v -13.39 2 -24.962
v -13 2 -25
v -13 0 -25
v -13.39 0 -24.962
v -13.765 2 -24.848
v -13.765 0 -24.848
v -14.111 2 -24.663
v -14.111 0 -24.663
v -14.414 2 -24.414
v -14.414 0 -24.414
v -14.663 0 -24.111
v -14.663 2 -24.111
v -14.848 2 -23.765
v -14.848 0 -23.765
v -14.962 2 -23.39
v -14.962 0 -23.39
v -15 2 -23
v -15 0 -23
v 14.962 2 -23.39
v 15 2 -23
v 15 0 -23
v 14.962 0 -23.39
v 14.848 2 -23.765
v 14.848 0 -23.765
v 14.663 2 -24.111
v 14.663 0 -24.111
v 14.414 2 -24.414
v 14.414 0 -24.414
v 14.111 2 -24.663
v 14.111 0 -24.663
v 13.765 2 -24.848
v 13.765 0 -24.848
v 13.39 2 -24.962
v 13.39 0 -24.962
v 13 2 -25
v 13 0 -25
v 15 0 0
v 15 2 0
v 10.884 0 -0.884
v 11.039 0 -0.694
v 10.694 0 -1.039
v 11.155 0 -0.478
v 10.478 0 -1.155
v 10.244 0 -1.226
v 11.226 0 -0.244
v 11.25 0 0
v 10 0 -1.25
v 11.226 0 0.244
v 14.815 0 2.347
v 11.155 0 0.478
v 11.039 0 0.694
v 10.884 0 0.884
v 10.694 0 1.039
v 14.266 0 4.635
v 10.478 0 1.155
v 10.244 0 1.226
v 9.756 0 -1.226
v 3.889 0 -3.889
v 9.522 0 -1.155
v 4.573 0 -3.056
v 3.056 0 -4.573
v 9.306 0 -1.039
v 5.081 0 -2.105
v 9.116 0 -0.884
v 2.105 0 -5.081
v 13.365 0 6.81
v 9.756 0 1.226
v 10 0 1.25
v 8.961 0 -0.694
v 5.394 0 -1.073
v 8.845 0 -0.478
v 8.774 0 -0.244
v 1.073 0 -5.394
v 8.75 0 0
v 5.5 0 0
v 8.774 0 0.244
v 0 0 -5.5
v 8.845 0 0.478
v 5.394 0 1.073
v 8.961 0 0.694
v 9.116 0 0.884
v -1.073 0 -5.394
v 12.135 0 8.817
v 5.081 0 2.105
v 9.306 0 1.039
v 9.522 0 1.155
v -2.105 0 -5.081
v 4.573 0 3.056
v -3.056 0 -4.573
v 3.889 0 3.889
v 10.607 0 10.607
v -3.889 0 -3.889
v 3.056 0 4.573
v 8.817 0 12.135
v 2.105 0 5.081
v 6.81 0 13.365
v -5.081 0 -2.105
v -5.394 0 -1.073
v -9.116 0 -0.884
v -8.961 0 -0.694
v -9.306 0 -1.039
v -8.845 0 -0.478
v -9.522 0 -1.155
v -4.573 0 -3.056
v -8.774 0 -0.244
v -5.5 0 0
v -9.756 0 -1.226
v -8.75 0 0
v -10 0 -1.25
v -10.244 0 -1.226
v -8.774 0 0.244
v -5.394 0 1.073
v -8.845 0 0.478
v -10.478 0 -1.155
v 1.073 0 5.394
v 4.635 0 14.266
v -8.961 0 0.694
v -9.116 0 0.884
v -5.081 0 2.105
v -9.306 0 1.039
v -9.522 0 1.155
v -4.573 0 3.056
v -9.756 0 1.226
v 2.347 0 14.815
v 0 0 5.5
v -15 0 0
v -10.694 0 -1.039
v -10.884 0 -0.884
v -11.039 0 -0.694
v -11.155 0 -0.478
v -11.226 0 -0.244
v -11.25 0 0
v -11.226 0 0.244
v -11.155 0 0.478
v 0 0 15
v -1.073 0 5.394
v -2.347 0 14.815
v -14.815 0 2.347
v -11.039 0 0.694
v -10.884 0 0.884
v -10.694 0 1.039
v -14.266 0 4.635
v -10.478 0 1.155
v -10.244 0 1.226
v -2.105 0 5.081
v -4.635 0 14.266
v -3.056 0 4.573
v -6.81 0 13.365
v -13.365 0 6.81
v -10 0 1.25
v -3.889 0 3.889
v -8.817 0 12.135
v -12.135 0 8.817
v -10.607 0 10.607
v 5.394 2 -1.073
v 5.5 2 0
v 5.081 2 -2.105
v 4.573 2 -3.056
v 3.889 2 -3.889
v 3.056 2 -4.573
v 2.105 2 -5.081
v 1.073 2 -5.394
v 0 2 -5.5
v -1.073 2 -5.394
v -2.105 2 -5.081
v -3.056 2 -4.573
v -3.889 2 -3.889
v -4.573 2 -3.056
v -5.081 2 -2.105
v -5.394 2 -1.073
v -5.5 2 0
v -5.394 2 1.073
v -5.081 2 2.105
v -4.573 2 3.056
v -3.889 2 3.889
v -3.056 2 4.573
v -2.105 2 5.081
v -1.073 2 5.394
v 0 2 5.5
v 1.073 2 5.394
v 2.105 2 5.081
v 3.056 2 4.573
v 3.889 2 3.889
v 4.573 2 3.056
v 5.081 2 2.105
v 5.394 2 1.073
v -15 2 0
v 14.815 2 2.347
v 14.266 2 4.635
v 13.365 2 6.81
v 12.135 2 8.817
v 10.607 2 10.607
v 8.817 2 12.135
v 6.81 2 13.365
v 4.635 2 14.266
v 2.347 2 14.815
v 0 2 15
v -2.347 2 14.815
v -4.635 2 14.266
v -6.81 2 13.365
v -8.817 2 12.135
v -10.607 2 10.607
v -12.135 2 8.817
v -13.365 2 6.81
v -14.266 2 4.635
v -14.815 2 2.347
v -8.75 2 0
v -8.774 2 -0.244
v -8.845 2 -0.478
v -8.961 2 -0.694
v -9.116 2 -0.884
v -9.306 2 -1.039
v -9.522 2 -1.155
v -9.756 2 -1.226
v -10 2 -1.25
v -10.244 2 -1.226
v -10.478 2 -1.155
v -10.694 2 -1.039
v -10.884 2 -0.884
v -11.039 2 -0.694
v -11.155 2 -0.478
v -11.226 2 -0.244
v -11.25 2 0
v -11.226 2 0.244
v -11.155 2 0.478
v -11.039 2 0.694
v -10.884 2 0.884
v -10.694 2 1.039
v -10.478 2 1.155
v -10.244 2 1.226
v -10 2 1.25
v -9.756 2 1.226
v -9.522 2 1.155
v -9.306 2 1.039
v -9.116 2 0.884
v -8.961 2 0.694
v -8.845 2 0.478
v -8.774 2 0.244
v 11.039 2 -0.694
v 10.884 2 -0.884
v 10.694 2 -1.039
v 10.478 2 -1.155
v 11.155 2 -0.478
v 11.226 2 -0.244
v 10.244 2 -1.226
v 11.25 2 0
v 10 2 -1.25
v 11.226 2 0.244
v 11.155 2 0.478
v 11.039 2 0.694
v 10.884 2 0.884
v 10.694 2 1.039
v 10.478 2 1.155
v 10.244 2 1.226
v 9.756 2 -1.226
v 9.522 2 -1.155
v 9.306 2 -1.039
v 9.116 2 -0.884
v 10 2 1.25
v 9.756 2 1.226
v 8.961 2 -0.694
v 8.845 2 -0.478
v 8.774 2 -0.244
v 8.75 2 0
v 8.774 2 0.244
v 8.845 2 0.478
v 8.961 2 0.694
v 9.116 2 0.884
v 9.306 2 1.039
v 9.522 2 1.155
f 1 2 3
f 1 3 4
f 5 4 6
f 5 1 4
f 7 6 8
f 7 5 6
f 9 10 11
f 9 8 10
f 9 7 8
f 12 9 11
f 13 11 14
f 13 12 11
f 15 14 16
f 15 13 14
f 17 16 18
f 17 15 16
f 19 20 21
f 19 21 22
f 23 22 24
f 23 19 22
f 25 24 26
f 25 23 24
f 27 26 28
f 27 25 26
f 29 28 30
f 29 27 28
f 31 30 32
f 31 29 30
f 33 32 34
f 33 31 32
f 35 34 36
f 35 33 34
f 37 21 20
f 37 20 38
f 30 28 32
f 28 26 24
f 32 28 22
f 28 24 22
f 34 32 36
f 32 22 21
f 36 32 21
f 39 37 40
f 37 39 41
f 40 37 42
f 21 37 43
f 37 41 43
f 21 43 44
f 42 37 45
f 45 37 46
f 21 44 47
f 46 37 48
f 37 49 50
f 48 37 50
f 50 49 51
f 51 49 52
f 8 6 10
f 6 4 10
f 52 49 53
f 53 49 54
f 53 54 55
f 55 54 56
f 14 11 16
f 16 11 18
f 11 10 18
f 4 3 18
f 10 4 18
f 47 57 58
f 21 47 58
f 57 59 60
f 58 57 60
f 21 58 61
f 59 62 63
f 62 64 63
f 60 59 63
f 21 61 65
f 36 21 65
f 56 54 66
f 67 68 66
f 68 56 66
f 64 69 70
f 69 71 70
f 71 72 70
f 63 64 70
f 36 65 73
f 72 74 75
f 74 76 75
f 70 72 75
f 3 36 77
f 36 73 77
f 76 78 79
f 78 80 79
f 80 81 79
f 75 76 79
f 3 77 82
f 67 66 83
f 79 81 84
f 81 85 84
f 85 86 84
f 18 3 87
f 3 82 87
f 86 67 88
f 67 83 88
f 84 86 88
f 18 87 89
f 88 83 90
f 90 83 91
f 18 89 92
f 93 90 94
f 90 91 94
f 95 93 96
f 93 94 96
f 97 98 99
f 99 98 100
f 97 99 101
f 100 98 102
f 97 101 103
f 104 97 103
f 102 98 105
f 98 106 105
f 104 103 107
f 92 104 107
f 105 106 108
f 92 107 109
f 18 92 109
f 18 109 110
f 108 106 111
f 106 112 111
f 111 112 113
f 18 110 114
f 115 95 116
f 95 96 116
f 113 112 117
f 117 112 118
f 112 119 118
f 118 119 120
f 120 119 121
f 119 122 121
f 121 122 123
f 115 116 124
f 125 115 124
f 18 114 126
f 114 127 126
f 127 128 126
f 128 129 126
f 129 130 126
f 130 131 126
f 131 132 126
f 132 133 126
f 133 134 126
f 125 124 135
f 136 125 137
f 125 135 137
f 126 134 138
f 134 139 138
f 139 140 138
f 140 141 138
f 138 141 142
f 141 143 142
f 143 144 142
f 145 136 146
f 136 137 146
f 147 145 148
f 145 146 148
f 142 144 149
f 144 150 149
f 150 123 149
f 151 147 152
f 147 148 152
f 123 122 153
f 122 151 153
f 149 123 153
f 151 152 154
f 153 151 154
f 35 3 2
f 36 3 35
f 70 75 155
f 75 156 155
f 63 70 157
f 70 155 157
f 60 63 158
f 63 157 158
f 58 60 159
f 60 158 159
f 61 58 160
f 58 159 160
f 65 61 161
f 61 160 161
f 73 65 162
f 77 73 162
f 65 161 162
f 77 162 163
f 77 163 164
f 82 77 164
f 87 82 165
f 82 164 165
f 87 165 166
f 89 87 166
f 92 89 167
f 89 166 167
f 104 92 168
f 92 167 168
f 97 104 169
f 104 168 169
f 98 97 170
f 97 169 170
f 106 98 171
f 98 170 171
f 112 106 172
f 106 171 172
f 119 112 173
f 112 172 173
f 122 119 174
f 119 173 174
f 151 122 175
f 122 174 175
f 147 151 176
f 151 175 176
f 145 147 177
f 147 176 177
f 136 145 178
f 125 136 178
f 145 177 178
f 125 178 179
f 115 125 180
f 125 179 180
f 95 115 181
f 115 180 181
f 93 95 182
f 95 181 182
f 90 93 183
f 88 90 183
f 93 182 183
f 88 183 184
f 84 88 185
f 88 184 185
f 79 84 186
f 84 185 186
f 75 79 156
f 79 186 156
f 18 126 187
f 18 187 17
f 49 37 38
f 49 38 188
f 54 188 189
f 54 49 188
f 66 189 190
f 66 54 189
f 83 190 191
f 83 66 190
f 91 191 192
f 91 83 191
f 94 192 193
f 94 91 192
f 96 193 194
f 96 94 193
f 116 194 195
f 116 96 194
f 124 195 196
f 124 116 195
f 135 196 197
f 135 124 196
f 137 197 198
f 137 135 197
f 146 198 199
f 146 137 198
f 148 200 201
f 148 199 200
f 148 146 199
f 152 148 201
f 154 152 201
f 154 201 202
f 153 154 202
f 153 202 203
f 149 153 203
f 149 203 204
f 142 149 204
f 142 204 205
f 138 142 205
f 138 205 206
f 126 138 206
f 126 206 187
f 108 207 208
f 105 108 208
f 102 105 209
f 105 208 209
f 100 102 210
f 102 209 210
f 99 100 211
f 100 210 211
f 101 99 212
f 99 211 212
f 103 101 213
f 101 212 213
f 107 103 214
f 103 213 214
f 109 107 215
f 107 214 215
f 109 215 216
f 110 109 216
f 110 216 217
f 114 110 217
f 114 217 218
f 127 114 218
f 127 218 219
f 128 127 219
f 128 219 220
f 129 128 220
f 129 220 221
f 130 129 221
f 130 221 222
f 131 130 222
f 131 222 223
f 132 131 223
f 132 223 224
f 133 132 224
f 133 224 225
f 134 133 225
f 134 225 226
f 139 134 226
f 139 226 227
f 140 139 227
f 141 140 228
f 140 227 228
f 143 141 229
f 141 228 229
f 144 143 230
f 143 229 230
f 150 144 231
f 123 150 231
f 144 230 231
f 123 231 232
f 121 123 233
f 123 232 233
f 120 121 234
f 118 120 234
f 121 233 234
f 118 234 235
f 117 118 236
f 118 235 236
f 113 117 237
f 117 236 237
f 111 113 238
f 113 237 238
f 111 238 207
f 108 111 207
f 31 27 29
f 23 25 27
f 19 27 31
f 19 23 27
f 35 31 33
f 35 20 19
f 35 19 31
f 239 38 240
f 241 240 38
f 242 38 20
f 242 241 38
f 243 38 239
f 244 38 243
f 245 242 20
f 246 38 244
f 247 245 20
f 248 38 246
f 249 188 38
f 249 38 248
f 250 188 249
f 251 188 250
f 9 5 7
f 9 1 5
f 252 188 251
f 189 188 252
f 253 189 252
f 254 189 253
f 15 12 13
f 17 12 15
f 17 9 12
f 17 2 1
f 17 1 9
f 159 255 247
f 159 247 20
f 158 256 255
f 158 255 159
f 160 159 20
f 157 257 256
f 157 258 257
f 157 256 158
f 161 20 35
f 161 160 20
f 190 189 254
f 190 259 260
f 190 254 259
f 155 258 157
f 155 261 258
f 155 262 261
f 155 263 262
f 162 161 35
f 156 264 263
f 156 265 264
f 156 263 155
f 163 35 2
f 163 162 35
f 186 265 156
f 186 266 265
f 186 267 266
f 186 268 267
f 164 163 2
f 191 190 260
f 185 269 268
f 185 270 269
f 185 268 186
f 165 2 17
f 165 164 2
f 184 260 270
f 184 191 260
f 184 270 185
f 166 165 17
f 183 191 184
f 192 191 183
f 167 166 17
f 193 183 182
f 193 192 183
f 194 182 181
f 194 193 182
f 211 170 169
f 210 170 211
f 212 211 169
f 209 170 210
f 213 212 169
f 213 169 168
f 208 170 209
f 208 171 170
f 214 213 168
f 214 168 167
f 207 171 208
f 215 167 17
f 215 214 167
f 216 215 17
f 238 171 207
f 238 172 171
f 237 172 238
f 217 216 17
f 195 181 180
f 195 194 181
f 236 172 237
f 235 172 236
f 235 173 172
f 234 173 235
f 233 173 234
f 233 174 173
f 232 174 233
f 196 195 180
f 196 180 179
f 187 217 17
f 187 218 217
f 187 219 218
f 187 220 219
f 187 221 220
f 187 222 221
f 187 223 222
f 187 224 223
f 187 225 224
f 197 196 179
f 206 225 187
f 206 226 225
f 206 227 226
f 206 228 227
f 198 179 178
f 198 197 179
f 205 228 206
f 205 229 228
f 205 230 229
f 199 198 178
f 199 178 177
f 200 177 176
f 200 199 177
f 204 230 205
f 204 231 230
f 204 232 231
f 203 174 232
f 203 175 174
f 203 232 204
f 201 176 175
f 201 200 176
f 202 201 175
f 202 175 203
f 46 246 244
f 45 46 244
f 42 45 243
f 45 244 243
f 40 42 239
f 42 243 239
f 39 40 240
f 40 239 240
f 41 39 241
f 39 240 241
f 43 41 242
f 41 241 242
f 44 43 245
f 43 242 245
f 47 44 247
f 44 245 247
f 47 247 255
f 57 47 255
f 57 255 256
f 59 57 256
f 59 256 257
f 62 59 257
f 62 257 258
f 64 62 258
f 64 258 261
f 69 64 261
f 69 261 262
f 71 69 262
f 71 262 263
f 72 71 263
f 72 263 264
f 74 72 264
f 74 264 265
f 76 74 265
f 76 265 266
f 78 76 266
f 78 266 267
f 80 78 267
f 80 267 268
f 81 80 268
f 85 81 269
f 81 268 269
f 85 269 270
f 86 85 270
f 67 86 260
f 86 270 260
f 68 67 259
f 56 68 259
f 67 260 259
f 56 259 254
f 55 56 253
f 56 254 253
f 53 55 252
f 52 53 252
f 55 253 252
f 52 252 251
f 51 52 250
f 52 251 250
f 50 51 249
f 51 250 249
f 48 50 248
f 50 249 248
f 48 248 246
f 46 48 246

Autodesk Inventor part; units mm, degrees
ref_plane "YZ Plane" through (0, 0, 0) normal (1, 0, 0) x (0, 1, 0)
ref_plane "XZ Plane" through (0, 0, 0) normal (0, 1, 0) x (-1, 0, 0)
ref_plane "XY Plane" through (0, 0, 0) normal (0, 0, 1) x (1, 0, 0)
sketch "Esquisse1" plane through (0, 0, 0) normal (0, 1, 0) x (-1, 0, 0)
  arc A0 (15, 0) -> (-15, 0) centre (0, 0) ccw
  line L0 (-15, 0) -> (15, 0) construction
  line L1 (15, 0) -> (15, -25)
  line L2 (15, -25) -> (-15, -25)
  line L3 (-15, -25) -> (-15, 0)
  arc A1 (-15, 0) -> (15, 0) centre (0, 0) ccw construction
  dimension "d0" = 30
  dimension "d1" = 25
extrude "Extrusion1" add sketch "Esquisse1" along normal blind 2
sketch "Esquisse2" plane through (0, 2, 0) normal (0, 1, 0) x (1, 0, 0)
  arc A0 (-15, 0) -> (15, 0) centre (0, 0) ccw projected
  line L0 (15, 25) -> (-15, 25) projected
  circle A1 centre (-10, 0) radius 1.25
  circle A2 centre (10, 0) radius 1.25
  line L1 (0, 0) -> (0, 25) construction
  line L2 (0, 0) -> (-15, 0) construction
  dimension "d4" = 2.5
  dimension "d5" = 10
extrude "Extrusion2" cut sketch "Esquisse2" against normal through all
sketch "Esquisse3" plane through (0, 2, 0) normal (0, 1, 0) x (1, 0, 0)
  arc A0 (-15, 0) -> (15, 0) centre (0, 0) ccw projected
  circle A1 centre (0, 0) radius 5.5
  dimension "d8" = 11
extrude "Extrusion3" cut sketch "Esquisse3" against normal through all
fillet "Congé1" radius 2 2 edges at (-15, 1, -25) (15, 1, -25)
properties part number "encoder_fixation"
